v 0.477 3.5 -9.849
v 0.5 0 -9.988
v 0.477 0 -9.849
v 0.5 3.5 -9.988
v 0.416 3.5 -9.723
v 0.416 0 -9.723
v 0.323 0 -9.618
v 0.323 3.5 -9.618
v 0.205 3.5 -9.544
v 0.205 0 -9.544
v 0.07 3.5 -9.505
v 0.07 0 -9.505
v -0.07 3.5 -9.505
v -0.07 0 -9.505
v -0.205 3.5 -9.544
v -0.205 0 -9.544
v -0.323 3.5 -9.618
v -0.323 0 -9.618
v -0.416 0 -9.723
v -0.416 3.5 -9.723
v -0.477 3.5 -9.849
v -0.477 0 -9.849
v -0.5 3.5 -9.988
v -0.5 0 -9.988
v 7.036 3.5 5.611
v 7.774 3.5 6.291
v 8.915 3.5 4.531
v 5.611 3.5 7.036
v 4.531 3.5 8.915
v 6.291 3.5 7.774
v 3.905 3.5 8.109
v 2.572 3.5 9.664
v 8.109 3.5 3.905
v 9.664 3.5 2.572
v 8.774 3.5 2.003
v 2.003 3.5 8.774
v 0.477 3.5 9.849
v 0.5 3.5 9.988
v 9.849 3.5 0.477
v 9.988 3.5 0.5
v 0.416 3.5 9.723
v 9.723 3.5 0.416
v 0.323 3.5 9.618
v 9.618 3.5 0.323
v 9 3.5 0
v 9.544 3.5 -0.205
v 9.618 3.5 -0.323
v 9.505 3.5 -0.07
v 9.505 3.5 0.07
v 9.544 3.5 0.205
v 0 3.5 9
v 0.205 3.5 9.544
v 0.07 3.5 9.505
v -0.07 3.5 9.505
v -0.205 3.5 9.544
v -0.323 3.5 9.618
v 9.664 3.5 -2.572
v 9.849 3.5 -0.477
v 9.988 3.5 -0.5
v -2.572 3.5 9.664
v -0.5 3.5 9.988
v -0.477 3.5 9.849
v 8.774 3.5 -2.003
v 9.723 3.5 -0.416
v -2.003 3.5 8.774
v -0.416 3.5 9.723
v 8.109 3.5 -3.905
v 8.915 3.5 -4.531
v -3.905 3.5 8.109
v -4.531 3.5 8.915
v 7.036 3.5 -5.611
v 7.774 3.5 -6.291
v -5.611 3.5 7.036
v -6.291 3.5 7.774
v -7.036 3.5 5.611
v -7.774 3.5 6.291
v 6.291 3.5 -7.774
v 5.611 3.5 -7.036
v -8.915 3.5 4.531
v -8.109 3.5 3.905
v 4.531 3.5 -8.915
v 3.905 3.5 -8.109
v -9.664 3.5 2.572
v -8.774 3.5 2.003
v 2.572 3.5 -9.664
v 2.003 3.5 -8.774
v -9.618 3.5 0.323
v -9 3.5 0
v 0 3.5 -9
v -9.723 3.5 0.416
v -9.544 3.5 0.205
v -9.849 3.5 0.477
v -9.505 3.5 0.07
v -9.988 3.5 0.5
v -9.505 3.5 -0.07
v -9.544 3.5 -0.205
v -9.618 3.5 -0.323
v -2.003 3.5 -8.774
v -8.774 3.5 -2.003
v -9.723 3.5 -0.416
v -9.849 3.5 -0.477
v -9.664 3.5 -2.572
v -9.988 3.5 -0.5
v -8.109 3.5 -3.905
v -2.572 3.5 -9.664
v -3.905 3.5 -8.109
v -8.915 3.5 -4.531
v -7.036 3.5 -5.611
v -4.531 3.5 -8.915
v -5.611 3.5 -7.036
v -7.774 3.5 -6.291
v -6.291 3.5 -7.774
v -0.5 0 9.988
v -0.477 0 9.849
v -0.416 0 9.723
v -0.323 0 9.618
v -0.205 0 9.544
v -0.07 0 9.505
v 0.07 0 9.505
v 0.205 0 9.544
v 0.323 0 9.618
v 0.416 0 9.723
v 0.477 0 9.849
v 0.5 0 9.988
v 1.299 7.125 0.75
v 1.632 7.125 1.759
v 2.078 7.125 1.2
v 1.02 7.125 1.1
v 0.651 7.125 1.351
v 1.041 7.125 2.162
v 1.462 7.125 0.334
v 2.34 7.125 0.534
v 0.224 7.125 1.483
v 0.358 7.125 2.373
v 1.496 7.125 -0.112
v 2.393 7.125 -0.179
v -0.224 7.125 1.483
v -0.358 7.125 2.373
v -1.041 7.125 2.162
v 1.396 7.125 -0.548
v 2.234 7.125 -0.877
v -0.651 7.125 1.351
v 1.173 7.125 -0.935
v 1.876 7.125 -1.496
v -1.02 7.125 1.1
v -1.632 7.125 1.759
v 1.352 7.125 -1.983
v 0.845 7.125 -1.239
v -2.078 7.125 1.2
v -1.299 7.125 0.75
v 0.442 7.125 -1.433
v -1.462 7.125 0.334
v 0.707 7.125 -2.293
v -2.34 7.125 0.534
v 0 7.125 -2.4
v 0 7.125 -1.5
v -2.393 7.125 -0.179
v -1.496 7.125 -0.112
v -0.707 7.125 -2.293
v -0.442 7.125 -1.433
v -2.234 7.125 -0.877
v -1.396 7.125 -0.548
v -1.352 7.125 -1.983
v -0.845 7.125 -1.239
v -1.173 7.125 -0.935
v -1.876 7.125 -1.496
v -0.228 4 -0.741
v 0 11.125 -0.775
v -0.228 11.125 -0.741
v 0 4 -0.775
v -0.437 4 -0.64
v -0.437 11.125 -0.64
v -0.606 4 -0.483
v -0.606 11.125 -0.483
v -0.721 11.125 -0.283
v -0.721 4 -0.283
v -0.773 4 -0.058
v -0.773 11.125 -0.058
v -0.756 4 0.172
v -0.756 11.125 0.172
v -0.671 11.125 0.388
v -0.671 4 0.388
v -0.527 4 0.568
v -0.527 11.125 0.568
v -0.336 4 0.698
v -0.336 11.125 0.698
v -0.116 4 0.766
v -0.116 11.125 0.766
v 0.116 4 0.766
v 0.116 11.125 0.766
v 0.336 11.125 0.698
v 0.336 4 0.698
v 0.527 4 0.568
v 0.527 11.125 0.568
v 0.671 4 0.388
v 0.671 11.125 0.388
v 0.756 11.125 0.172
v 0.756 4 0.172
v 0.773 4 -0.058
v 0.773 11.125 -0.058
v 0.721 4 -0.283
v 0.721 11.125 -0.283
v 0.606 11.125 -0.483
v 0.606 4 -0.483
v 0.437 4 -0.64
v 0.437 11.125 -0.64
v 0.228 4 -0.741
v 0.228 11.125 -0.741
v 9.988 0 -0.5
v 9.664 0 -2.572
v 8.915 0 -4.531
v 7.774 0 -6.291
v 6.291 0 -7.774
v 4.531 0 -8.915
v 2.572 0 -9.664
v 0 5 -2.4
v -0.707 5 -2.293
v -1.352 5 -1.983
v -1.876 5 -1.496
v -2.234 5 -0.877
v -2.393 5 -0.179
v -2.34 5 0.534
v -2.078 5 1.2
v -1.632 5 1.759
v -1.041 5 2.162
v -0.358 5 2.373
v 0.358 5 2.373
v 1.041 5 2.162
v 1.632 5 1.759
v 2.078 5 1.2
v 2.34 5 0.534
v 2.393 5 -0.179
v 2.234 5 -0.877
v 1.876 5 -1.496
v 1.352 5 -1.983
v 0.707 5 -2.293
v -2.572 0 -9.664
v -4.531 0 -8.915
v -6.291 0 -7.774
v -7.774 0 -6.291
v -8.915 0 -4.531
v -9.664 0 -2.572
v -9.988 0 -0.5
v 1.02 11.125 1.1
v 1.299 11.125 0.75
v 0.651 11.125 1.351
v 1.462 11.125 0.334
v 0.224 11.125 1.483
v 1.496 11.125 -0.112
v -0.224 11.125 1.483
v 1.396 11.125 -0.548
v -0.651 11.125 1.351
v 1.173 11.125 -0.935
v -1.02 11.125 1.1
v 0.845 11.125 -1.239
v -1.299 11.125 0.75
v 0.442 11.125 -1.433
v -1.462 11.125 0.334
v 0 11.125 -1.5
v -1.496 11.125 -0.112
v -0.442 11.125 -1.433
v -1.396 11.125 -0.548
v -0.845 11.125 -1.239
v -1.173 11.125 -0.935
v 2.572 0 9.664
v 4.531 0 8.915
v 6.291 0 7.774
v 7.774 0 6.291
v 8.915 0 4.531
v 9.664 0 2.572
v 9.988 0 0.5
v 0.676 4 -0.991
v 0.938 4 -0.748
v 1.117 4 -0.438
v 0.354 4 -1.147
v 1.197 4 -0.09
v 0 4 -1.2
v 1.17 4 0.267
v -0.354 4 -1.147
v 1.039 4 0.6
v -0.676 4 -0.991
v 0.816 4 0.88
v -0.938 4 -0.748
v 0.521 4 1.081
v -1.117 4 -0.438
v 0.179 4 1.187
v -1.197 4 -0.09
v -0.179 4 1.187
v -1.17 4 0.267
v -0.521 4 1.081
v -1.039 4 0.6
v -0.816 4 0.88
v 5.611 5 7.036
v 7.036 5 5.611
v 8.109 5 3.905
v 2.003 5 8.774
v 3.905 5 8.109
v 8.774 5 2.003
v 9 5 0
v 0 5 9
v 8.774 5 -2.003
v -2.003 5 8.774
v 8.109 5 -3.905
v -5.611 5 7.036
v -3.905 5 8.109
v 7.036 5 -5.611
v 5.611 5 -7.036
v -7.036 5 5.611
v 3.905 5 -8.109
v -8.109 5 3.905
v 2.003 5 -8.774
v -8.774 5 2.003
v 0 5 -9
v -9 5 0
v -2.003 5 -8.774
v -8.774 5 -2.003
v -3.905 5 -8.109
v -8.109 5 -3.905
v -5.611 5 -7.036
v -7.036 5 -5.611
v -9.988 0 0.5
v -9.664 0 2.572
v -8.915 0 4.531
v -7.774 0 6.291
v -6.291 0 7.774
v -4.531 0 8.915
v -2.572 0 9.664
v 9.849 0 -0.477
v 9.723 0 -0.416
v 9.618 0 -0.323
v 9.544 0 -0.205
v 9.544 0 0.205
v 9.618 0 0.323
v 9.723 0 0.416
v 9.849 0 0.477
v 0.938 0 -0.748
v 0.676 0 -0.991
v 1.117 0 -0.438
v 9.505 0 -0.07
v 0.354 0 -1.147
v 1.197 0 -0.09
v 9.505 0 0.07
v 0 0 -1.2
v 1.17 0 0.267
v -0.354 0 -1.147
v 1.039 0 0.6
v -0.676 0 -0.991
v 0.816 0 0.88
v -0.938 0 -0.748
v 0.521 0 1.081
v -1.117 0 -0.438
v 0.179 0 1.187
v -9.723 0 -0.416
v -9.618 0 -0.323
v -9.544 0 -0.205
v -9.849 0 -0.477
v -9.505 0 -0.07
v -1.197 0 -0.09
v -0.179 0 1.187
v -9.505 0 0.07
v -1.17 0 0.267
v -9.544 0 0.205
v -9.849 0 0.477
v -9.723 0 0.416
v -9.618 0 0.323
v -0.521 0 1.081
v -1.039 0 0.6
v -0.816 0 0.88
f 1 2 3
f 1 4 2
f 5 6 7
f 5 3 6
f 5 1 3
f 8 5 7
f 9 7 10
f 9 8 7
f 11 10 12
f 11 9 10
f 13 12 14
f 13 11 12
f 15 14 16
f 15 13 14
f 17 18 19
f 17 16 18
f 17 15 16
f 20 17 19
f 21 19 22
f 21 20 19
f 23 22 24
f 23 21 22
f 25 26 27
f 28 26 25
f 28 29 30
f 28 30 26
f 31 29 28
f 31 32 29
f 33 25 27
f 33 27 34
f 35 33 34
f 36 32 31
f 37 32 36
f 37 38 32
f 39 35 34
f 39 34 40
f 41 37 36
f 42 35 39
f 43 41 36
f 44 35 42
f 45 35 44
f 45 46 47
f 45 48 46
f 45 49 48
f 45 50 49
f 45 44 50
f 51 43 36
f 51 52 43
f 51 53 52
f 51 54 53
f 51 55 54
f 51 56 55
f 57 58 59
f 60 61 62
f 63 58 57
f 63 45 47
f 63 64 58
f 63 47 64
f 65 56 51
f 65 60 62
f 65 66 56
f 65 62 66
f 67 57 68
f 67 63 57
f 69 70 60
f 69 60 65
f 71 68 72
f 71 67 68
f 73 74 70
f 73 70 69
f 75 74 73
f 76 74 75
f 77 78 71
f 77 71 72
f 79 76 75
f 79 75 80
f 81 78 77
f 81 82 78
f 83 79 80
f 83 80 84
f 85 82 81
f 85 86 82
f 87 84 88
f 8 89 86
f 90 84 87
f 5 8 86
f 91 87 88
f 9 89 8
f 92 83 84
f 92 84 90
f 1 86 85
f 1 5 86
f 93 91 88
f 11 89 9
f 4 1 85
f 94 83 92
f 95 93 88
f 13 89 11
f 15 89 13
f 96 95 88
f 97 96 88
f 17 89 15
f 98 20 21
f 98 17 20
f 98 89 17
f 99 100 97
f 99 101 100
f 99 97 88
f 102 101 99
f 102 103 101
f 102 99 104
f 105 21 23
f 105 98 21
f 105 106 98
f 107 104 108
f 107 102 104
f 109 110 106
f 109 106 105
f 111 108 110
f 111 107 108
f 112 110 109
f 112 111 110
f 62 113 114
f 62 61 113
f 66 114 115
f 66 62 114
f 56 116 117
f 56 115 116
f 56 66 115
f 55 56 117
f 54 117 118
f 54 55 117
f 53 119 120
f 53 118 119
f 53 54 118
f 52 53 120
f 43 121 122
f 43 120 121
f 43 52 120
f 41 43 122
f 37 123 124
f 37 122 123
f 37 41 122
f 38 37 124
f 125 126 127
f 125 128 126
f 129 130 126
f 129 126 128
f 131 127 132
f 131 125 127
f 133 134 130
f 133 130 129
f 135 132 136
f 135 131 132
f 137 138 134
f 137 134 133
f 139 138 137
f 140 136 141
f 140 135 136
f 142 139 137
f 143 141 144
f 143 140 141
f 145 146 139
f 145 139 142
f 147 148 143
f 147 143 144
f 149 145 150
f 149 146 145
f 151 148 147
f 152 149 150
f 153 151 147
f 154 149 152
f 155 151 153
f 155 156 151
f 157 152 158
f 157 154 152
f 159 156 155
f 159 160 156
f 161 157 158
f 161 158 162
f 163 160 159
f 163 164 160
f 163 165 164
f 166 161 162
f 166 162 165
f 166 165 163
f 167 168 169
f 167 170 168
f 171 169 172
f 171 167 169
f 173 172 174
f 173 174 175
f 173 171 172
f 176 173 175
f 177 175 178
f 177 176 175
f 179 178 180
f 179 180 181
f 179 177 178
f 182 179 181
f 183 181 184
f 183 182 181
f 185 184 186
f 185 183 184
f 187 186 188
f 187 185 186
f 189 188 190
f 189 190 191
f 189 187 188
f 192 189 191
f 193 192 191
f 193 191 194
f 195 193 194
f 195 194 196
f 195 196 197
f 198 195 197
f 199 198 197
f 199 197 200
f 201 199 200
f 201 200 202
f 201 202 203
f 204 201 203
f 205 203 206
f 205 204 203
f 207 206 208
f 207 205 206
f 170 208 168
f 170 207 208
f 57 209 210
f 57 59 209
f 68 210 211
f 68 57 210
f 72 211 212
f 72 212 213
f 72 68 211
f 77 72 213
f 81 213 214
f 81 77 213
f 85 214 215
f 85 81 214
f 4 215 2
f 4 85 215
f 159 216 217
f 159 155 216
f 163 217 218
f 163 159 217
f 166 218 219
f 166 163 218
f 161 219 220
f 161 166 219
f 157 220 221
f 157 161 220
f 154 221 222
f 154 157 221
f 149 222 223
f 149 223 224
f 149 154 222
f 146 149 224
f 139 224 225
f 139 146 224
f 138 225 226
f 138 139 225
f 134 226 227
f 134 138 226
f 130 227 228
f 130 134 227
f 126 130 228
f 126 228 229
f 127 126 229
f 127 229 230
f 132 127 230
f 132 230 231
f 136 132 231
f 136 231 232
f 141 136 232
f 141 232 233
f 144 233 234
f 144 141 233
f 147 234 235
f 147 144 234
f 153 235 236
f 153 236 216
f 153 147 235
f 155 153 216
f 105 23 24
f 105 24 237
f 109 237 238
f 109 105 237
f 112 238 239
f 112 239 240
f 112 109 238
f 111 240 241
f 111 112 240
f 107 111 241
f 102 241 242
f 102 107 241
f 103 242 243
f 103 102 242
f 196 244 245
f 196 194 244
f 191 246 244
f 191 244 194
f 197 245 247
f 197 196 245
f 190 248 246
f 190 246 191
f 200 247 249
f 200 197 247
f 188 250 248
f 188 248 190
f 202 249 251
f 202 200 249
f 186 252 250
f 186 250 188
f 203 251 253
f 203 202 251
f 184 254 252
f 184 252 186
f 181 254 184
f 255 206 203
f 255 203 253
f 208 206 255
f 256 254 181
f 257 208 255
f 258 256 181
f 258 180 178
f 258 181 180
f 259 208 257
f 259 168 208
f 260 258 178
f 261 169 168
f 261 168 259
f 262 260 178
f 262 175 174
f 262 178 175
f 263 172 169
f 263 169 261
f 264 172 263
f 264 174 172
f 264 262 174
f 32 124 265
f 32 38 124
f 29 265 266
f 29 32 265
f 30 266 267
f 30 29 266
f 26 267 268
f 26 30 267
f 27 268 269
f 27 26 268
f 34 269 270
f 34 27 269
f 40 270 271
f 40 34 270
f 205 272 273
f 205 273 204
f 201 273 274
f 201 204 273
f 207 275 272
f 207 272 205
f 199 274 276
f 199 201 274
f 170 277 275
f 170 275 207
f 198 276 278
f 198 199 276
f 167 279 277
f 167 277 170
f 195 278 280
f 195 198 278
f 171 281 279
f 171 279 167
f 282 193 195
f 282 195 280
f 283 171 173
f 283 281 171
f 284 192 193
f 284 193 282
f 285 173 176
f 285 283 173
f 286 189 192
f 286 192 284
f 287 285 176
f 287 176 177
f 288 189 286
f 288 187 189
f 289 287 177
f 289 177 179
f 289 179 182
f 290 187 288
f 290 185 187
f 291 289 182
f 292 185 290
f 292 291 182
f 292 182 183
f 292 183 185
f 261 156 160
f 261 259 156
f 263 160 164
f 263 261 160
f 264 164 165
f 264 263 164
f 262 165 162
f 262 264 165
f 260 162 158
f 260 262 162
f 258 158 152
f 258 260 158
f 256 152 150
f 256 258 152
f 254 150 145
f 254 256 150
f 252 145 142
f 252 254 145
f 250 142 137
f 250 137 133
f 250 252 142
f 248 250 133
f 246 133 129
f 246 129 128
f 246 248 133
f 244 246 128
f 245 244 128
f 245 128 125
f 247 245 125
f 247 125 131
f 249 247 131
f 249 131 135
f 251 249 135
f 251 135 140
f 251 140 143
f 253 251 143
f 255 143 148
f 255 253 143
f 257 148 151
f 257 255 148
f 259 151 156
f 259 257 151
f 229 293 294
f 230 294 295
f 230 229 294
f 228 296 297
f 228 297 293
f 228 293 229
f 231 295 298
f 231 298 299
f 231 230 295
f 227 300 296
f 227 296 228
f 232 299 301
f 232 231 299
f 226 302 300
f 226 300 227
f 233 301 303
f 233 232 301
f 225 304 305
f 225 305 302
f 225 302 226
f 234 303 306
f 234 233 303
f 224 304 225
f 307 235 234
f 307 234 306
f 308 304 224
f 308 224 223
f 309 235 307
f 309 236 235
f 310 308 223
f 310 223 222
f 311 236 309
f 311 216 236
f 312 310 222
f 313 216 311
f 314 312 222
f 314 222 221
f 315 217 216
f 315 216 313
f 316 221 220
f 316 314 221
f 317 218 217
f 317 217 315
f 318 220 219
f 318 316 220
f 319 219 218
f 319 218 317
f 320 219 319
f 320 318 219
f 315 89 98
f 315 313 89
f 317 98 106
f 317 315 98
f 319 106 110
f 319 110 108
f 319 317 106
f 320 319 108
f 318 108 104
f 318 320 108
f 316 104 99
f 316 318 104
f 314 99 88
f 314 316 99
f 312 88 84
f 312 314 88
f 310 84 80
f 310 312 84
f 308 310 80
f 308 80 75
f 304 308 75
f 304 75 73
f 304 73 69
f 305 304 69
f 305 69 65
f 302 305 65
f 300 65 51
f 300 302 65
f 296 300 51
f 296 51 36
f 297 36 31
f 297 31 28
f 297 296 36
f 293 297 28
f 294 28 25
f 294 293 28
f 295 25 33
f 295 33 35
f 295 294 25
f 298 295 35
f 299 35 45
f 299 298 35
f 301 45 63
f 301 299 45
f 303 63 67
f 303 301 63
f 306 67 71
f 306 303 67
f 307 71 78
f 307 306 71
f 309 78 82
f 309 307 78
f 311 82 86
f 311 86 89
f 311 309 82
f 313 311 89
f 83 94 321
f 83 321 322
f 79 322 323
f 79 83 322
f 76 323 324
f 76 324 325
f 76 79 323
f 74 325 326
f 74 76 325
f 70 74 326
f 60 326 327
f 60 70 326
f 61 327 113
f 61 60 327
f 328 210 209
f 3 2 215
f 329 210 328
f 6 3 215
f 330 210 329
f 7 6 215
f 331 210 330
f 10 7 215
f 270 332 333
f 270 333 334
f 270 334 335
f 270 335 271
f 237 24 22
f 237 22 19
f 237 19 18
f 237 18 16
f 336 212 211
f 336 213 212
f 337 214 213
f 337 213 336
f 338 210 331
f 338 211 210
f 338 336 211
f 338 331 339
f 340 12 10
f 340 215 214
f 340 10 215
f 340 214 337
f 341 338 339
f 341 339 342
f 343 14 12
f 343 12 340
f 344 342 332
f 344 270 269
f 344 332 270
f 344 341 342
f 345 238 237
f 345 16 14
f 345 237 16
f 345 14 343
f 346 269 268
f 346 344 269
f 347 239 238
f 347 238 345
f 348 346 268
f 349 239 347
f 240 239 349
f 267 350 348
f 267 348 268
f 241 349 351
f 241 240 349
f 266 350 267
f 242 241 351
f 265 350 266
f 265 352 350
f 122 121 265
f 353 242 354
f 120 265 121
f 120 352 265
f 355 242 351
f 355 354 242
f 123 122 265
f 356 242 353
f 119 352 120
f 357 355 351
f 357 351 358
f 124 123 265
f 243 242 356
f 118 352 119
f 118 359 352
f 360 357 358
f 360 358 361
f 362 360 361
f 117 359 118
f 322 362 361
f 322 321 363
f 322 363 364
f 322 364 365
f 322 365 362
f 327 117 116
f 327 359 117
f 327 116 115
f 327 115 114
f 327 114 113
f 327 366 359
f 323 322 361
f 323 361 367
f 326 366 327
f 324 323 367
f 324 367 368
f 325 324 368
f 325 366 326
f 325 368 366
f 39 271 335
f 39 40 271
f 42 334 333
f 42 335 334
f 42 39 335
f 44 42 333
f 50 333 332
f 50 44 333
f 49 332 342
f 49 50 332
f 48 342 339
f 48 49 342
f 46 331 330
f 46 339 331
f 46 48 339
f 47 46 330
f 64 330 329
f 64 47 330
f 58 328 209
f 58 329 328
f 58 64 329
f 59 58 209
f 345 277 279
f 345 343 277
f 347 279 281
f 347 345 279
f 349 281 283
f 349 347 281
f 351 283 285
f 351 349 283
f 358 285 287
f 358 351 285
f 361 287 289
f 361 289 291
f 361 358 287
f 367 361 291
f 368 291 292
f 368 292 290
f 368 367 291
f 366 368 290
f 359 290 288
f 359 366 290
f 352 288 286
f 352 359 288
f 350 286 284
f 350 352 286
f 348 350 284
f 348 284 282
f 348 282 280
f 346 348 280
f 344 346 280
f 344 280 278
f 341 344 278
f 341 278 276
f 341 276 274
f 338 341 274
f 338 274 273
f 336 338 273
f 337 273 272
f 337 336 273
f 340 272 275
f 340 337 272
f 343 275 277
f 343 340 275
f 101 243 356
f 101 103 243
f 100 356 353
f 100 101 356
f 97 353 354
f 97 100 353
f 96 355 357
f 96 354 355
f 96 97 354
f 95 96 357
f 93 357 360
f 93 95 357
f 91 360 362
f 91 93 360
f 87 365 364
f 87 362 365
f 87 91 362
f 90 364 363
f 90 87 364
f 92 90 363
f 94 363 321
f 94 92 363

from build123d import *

# Parameters (mm, degrees)
CUT_EXTRUDE1_DEPTH      = 18.993488406
CUT_EXTRUDE1_DEPTH_BACK = 18.993488406
SKETCH5_R               = 0.5


with BuildPart() as part:
    # Sketch4 → Revolve1 (revolve)
    with BuildSketch(Plane.XY, mode=Mode.PRIVATE) as revolve1_sk:
        Polygon((-0.775, 11.125), (-0.775, 4), (-1.2, 4), (-1.2, 0), (-10, 0), (-10, 3.5), (-9, 3.5), (-9, 5), (-2.4, 5), (-2.4, 7.125), (-1.5, 7.125), (-1.5, 11.125), align=None)
    revolve(revolve1_sk.sketch.rotate(Axis((0, 0, 0), (0, 1, 0)), 270), axis=Axis((0, 0, 0), (0, 1, 0)))

    # Sketch5 → Cut-Extrude1 (cut, two sides: drawn at the far end of the back side and taken through both)
    with BuildSketch(Plane.XZ.offset(-CUT_EXTRUDE1_DEPTH_BACK)):
        with Locations((0, 10)):
            Circle(SKETCH5_R)
        with Locations((10, 0)):
            Circle(SKETCH5_R)
        with Locations((0, -10)):
            Circle(SKETCH5_R)
        with Locations((-10, 0)):
            Circle(SKETCH5_R)
    extrude(amount=CUT_EXTRUDE1_DEPTH + CUT_EXTRUDE1_DEPTH_BACK, mode=Mode.SUBTRACT)


solid = part.part
